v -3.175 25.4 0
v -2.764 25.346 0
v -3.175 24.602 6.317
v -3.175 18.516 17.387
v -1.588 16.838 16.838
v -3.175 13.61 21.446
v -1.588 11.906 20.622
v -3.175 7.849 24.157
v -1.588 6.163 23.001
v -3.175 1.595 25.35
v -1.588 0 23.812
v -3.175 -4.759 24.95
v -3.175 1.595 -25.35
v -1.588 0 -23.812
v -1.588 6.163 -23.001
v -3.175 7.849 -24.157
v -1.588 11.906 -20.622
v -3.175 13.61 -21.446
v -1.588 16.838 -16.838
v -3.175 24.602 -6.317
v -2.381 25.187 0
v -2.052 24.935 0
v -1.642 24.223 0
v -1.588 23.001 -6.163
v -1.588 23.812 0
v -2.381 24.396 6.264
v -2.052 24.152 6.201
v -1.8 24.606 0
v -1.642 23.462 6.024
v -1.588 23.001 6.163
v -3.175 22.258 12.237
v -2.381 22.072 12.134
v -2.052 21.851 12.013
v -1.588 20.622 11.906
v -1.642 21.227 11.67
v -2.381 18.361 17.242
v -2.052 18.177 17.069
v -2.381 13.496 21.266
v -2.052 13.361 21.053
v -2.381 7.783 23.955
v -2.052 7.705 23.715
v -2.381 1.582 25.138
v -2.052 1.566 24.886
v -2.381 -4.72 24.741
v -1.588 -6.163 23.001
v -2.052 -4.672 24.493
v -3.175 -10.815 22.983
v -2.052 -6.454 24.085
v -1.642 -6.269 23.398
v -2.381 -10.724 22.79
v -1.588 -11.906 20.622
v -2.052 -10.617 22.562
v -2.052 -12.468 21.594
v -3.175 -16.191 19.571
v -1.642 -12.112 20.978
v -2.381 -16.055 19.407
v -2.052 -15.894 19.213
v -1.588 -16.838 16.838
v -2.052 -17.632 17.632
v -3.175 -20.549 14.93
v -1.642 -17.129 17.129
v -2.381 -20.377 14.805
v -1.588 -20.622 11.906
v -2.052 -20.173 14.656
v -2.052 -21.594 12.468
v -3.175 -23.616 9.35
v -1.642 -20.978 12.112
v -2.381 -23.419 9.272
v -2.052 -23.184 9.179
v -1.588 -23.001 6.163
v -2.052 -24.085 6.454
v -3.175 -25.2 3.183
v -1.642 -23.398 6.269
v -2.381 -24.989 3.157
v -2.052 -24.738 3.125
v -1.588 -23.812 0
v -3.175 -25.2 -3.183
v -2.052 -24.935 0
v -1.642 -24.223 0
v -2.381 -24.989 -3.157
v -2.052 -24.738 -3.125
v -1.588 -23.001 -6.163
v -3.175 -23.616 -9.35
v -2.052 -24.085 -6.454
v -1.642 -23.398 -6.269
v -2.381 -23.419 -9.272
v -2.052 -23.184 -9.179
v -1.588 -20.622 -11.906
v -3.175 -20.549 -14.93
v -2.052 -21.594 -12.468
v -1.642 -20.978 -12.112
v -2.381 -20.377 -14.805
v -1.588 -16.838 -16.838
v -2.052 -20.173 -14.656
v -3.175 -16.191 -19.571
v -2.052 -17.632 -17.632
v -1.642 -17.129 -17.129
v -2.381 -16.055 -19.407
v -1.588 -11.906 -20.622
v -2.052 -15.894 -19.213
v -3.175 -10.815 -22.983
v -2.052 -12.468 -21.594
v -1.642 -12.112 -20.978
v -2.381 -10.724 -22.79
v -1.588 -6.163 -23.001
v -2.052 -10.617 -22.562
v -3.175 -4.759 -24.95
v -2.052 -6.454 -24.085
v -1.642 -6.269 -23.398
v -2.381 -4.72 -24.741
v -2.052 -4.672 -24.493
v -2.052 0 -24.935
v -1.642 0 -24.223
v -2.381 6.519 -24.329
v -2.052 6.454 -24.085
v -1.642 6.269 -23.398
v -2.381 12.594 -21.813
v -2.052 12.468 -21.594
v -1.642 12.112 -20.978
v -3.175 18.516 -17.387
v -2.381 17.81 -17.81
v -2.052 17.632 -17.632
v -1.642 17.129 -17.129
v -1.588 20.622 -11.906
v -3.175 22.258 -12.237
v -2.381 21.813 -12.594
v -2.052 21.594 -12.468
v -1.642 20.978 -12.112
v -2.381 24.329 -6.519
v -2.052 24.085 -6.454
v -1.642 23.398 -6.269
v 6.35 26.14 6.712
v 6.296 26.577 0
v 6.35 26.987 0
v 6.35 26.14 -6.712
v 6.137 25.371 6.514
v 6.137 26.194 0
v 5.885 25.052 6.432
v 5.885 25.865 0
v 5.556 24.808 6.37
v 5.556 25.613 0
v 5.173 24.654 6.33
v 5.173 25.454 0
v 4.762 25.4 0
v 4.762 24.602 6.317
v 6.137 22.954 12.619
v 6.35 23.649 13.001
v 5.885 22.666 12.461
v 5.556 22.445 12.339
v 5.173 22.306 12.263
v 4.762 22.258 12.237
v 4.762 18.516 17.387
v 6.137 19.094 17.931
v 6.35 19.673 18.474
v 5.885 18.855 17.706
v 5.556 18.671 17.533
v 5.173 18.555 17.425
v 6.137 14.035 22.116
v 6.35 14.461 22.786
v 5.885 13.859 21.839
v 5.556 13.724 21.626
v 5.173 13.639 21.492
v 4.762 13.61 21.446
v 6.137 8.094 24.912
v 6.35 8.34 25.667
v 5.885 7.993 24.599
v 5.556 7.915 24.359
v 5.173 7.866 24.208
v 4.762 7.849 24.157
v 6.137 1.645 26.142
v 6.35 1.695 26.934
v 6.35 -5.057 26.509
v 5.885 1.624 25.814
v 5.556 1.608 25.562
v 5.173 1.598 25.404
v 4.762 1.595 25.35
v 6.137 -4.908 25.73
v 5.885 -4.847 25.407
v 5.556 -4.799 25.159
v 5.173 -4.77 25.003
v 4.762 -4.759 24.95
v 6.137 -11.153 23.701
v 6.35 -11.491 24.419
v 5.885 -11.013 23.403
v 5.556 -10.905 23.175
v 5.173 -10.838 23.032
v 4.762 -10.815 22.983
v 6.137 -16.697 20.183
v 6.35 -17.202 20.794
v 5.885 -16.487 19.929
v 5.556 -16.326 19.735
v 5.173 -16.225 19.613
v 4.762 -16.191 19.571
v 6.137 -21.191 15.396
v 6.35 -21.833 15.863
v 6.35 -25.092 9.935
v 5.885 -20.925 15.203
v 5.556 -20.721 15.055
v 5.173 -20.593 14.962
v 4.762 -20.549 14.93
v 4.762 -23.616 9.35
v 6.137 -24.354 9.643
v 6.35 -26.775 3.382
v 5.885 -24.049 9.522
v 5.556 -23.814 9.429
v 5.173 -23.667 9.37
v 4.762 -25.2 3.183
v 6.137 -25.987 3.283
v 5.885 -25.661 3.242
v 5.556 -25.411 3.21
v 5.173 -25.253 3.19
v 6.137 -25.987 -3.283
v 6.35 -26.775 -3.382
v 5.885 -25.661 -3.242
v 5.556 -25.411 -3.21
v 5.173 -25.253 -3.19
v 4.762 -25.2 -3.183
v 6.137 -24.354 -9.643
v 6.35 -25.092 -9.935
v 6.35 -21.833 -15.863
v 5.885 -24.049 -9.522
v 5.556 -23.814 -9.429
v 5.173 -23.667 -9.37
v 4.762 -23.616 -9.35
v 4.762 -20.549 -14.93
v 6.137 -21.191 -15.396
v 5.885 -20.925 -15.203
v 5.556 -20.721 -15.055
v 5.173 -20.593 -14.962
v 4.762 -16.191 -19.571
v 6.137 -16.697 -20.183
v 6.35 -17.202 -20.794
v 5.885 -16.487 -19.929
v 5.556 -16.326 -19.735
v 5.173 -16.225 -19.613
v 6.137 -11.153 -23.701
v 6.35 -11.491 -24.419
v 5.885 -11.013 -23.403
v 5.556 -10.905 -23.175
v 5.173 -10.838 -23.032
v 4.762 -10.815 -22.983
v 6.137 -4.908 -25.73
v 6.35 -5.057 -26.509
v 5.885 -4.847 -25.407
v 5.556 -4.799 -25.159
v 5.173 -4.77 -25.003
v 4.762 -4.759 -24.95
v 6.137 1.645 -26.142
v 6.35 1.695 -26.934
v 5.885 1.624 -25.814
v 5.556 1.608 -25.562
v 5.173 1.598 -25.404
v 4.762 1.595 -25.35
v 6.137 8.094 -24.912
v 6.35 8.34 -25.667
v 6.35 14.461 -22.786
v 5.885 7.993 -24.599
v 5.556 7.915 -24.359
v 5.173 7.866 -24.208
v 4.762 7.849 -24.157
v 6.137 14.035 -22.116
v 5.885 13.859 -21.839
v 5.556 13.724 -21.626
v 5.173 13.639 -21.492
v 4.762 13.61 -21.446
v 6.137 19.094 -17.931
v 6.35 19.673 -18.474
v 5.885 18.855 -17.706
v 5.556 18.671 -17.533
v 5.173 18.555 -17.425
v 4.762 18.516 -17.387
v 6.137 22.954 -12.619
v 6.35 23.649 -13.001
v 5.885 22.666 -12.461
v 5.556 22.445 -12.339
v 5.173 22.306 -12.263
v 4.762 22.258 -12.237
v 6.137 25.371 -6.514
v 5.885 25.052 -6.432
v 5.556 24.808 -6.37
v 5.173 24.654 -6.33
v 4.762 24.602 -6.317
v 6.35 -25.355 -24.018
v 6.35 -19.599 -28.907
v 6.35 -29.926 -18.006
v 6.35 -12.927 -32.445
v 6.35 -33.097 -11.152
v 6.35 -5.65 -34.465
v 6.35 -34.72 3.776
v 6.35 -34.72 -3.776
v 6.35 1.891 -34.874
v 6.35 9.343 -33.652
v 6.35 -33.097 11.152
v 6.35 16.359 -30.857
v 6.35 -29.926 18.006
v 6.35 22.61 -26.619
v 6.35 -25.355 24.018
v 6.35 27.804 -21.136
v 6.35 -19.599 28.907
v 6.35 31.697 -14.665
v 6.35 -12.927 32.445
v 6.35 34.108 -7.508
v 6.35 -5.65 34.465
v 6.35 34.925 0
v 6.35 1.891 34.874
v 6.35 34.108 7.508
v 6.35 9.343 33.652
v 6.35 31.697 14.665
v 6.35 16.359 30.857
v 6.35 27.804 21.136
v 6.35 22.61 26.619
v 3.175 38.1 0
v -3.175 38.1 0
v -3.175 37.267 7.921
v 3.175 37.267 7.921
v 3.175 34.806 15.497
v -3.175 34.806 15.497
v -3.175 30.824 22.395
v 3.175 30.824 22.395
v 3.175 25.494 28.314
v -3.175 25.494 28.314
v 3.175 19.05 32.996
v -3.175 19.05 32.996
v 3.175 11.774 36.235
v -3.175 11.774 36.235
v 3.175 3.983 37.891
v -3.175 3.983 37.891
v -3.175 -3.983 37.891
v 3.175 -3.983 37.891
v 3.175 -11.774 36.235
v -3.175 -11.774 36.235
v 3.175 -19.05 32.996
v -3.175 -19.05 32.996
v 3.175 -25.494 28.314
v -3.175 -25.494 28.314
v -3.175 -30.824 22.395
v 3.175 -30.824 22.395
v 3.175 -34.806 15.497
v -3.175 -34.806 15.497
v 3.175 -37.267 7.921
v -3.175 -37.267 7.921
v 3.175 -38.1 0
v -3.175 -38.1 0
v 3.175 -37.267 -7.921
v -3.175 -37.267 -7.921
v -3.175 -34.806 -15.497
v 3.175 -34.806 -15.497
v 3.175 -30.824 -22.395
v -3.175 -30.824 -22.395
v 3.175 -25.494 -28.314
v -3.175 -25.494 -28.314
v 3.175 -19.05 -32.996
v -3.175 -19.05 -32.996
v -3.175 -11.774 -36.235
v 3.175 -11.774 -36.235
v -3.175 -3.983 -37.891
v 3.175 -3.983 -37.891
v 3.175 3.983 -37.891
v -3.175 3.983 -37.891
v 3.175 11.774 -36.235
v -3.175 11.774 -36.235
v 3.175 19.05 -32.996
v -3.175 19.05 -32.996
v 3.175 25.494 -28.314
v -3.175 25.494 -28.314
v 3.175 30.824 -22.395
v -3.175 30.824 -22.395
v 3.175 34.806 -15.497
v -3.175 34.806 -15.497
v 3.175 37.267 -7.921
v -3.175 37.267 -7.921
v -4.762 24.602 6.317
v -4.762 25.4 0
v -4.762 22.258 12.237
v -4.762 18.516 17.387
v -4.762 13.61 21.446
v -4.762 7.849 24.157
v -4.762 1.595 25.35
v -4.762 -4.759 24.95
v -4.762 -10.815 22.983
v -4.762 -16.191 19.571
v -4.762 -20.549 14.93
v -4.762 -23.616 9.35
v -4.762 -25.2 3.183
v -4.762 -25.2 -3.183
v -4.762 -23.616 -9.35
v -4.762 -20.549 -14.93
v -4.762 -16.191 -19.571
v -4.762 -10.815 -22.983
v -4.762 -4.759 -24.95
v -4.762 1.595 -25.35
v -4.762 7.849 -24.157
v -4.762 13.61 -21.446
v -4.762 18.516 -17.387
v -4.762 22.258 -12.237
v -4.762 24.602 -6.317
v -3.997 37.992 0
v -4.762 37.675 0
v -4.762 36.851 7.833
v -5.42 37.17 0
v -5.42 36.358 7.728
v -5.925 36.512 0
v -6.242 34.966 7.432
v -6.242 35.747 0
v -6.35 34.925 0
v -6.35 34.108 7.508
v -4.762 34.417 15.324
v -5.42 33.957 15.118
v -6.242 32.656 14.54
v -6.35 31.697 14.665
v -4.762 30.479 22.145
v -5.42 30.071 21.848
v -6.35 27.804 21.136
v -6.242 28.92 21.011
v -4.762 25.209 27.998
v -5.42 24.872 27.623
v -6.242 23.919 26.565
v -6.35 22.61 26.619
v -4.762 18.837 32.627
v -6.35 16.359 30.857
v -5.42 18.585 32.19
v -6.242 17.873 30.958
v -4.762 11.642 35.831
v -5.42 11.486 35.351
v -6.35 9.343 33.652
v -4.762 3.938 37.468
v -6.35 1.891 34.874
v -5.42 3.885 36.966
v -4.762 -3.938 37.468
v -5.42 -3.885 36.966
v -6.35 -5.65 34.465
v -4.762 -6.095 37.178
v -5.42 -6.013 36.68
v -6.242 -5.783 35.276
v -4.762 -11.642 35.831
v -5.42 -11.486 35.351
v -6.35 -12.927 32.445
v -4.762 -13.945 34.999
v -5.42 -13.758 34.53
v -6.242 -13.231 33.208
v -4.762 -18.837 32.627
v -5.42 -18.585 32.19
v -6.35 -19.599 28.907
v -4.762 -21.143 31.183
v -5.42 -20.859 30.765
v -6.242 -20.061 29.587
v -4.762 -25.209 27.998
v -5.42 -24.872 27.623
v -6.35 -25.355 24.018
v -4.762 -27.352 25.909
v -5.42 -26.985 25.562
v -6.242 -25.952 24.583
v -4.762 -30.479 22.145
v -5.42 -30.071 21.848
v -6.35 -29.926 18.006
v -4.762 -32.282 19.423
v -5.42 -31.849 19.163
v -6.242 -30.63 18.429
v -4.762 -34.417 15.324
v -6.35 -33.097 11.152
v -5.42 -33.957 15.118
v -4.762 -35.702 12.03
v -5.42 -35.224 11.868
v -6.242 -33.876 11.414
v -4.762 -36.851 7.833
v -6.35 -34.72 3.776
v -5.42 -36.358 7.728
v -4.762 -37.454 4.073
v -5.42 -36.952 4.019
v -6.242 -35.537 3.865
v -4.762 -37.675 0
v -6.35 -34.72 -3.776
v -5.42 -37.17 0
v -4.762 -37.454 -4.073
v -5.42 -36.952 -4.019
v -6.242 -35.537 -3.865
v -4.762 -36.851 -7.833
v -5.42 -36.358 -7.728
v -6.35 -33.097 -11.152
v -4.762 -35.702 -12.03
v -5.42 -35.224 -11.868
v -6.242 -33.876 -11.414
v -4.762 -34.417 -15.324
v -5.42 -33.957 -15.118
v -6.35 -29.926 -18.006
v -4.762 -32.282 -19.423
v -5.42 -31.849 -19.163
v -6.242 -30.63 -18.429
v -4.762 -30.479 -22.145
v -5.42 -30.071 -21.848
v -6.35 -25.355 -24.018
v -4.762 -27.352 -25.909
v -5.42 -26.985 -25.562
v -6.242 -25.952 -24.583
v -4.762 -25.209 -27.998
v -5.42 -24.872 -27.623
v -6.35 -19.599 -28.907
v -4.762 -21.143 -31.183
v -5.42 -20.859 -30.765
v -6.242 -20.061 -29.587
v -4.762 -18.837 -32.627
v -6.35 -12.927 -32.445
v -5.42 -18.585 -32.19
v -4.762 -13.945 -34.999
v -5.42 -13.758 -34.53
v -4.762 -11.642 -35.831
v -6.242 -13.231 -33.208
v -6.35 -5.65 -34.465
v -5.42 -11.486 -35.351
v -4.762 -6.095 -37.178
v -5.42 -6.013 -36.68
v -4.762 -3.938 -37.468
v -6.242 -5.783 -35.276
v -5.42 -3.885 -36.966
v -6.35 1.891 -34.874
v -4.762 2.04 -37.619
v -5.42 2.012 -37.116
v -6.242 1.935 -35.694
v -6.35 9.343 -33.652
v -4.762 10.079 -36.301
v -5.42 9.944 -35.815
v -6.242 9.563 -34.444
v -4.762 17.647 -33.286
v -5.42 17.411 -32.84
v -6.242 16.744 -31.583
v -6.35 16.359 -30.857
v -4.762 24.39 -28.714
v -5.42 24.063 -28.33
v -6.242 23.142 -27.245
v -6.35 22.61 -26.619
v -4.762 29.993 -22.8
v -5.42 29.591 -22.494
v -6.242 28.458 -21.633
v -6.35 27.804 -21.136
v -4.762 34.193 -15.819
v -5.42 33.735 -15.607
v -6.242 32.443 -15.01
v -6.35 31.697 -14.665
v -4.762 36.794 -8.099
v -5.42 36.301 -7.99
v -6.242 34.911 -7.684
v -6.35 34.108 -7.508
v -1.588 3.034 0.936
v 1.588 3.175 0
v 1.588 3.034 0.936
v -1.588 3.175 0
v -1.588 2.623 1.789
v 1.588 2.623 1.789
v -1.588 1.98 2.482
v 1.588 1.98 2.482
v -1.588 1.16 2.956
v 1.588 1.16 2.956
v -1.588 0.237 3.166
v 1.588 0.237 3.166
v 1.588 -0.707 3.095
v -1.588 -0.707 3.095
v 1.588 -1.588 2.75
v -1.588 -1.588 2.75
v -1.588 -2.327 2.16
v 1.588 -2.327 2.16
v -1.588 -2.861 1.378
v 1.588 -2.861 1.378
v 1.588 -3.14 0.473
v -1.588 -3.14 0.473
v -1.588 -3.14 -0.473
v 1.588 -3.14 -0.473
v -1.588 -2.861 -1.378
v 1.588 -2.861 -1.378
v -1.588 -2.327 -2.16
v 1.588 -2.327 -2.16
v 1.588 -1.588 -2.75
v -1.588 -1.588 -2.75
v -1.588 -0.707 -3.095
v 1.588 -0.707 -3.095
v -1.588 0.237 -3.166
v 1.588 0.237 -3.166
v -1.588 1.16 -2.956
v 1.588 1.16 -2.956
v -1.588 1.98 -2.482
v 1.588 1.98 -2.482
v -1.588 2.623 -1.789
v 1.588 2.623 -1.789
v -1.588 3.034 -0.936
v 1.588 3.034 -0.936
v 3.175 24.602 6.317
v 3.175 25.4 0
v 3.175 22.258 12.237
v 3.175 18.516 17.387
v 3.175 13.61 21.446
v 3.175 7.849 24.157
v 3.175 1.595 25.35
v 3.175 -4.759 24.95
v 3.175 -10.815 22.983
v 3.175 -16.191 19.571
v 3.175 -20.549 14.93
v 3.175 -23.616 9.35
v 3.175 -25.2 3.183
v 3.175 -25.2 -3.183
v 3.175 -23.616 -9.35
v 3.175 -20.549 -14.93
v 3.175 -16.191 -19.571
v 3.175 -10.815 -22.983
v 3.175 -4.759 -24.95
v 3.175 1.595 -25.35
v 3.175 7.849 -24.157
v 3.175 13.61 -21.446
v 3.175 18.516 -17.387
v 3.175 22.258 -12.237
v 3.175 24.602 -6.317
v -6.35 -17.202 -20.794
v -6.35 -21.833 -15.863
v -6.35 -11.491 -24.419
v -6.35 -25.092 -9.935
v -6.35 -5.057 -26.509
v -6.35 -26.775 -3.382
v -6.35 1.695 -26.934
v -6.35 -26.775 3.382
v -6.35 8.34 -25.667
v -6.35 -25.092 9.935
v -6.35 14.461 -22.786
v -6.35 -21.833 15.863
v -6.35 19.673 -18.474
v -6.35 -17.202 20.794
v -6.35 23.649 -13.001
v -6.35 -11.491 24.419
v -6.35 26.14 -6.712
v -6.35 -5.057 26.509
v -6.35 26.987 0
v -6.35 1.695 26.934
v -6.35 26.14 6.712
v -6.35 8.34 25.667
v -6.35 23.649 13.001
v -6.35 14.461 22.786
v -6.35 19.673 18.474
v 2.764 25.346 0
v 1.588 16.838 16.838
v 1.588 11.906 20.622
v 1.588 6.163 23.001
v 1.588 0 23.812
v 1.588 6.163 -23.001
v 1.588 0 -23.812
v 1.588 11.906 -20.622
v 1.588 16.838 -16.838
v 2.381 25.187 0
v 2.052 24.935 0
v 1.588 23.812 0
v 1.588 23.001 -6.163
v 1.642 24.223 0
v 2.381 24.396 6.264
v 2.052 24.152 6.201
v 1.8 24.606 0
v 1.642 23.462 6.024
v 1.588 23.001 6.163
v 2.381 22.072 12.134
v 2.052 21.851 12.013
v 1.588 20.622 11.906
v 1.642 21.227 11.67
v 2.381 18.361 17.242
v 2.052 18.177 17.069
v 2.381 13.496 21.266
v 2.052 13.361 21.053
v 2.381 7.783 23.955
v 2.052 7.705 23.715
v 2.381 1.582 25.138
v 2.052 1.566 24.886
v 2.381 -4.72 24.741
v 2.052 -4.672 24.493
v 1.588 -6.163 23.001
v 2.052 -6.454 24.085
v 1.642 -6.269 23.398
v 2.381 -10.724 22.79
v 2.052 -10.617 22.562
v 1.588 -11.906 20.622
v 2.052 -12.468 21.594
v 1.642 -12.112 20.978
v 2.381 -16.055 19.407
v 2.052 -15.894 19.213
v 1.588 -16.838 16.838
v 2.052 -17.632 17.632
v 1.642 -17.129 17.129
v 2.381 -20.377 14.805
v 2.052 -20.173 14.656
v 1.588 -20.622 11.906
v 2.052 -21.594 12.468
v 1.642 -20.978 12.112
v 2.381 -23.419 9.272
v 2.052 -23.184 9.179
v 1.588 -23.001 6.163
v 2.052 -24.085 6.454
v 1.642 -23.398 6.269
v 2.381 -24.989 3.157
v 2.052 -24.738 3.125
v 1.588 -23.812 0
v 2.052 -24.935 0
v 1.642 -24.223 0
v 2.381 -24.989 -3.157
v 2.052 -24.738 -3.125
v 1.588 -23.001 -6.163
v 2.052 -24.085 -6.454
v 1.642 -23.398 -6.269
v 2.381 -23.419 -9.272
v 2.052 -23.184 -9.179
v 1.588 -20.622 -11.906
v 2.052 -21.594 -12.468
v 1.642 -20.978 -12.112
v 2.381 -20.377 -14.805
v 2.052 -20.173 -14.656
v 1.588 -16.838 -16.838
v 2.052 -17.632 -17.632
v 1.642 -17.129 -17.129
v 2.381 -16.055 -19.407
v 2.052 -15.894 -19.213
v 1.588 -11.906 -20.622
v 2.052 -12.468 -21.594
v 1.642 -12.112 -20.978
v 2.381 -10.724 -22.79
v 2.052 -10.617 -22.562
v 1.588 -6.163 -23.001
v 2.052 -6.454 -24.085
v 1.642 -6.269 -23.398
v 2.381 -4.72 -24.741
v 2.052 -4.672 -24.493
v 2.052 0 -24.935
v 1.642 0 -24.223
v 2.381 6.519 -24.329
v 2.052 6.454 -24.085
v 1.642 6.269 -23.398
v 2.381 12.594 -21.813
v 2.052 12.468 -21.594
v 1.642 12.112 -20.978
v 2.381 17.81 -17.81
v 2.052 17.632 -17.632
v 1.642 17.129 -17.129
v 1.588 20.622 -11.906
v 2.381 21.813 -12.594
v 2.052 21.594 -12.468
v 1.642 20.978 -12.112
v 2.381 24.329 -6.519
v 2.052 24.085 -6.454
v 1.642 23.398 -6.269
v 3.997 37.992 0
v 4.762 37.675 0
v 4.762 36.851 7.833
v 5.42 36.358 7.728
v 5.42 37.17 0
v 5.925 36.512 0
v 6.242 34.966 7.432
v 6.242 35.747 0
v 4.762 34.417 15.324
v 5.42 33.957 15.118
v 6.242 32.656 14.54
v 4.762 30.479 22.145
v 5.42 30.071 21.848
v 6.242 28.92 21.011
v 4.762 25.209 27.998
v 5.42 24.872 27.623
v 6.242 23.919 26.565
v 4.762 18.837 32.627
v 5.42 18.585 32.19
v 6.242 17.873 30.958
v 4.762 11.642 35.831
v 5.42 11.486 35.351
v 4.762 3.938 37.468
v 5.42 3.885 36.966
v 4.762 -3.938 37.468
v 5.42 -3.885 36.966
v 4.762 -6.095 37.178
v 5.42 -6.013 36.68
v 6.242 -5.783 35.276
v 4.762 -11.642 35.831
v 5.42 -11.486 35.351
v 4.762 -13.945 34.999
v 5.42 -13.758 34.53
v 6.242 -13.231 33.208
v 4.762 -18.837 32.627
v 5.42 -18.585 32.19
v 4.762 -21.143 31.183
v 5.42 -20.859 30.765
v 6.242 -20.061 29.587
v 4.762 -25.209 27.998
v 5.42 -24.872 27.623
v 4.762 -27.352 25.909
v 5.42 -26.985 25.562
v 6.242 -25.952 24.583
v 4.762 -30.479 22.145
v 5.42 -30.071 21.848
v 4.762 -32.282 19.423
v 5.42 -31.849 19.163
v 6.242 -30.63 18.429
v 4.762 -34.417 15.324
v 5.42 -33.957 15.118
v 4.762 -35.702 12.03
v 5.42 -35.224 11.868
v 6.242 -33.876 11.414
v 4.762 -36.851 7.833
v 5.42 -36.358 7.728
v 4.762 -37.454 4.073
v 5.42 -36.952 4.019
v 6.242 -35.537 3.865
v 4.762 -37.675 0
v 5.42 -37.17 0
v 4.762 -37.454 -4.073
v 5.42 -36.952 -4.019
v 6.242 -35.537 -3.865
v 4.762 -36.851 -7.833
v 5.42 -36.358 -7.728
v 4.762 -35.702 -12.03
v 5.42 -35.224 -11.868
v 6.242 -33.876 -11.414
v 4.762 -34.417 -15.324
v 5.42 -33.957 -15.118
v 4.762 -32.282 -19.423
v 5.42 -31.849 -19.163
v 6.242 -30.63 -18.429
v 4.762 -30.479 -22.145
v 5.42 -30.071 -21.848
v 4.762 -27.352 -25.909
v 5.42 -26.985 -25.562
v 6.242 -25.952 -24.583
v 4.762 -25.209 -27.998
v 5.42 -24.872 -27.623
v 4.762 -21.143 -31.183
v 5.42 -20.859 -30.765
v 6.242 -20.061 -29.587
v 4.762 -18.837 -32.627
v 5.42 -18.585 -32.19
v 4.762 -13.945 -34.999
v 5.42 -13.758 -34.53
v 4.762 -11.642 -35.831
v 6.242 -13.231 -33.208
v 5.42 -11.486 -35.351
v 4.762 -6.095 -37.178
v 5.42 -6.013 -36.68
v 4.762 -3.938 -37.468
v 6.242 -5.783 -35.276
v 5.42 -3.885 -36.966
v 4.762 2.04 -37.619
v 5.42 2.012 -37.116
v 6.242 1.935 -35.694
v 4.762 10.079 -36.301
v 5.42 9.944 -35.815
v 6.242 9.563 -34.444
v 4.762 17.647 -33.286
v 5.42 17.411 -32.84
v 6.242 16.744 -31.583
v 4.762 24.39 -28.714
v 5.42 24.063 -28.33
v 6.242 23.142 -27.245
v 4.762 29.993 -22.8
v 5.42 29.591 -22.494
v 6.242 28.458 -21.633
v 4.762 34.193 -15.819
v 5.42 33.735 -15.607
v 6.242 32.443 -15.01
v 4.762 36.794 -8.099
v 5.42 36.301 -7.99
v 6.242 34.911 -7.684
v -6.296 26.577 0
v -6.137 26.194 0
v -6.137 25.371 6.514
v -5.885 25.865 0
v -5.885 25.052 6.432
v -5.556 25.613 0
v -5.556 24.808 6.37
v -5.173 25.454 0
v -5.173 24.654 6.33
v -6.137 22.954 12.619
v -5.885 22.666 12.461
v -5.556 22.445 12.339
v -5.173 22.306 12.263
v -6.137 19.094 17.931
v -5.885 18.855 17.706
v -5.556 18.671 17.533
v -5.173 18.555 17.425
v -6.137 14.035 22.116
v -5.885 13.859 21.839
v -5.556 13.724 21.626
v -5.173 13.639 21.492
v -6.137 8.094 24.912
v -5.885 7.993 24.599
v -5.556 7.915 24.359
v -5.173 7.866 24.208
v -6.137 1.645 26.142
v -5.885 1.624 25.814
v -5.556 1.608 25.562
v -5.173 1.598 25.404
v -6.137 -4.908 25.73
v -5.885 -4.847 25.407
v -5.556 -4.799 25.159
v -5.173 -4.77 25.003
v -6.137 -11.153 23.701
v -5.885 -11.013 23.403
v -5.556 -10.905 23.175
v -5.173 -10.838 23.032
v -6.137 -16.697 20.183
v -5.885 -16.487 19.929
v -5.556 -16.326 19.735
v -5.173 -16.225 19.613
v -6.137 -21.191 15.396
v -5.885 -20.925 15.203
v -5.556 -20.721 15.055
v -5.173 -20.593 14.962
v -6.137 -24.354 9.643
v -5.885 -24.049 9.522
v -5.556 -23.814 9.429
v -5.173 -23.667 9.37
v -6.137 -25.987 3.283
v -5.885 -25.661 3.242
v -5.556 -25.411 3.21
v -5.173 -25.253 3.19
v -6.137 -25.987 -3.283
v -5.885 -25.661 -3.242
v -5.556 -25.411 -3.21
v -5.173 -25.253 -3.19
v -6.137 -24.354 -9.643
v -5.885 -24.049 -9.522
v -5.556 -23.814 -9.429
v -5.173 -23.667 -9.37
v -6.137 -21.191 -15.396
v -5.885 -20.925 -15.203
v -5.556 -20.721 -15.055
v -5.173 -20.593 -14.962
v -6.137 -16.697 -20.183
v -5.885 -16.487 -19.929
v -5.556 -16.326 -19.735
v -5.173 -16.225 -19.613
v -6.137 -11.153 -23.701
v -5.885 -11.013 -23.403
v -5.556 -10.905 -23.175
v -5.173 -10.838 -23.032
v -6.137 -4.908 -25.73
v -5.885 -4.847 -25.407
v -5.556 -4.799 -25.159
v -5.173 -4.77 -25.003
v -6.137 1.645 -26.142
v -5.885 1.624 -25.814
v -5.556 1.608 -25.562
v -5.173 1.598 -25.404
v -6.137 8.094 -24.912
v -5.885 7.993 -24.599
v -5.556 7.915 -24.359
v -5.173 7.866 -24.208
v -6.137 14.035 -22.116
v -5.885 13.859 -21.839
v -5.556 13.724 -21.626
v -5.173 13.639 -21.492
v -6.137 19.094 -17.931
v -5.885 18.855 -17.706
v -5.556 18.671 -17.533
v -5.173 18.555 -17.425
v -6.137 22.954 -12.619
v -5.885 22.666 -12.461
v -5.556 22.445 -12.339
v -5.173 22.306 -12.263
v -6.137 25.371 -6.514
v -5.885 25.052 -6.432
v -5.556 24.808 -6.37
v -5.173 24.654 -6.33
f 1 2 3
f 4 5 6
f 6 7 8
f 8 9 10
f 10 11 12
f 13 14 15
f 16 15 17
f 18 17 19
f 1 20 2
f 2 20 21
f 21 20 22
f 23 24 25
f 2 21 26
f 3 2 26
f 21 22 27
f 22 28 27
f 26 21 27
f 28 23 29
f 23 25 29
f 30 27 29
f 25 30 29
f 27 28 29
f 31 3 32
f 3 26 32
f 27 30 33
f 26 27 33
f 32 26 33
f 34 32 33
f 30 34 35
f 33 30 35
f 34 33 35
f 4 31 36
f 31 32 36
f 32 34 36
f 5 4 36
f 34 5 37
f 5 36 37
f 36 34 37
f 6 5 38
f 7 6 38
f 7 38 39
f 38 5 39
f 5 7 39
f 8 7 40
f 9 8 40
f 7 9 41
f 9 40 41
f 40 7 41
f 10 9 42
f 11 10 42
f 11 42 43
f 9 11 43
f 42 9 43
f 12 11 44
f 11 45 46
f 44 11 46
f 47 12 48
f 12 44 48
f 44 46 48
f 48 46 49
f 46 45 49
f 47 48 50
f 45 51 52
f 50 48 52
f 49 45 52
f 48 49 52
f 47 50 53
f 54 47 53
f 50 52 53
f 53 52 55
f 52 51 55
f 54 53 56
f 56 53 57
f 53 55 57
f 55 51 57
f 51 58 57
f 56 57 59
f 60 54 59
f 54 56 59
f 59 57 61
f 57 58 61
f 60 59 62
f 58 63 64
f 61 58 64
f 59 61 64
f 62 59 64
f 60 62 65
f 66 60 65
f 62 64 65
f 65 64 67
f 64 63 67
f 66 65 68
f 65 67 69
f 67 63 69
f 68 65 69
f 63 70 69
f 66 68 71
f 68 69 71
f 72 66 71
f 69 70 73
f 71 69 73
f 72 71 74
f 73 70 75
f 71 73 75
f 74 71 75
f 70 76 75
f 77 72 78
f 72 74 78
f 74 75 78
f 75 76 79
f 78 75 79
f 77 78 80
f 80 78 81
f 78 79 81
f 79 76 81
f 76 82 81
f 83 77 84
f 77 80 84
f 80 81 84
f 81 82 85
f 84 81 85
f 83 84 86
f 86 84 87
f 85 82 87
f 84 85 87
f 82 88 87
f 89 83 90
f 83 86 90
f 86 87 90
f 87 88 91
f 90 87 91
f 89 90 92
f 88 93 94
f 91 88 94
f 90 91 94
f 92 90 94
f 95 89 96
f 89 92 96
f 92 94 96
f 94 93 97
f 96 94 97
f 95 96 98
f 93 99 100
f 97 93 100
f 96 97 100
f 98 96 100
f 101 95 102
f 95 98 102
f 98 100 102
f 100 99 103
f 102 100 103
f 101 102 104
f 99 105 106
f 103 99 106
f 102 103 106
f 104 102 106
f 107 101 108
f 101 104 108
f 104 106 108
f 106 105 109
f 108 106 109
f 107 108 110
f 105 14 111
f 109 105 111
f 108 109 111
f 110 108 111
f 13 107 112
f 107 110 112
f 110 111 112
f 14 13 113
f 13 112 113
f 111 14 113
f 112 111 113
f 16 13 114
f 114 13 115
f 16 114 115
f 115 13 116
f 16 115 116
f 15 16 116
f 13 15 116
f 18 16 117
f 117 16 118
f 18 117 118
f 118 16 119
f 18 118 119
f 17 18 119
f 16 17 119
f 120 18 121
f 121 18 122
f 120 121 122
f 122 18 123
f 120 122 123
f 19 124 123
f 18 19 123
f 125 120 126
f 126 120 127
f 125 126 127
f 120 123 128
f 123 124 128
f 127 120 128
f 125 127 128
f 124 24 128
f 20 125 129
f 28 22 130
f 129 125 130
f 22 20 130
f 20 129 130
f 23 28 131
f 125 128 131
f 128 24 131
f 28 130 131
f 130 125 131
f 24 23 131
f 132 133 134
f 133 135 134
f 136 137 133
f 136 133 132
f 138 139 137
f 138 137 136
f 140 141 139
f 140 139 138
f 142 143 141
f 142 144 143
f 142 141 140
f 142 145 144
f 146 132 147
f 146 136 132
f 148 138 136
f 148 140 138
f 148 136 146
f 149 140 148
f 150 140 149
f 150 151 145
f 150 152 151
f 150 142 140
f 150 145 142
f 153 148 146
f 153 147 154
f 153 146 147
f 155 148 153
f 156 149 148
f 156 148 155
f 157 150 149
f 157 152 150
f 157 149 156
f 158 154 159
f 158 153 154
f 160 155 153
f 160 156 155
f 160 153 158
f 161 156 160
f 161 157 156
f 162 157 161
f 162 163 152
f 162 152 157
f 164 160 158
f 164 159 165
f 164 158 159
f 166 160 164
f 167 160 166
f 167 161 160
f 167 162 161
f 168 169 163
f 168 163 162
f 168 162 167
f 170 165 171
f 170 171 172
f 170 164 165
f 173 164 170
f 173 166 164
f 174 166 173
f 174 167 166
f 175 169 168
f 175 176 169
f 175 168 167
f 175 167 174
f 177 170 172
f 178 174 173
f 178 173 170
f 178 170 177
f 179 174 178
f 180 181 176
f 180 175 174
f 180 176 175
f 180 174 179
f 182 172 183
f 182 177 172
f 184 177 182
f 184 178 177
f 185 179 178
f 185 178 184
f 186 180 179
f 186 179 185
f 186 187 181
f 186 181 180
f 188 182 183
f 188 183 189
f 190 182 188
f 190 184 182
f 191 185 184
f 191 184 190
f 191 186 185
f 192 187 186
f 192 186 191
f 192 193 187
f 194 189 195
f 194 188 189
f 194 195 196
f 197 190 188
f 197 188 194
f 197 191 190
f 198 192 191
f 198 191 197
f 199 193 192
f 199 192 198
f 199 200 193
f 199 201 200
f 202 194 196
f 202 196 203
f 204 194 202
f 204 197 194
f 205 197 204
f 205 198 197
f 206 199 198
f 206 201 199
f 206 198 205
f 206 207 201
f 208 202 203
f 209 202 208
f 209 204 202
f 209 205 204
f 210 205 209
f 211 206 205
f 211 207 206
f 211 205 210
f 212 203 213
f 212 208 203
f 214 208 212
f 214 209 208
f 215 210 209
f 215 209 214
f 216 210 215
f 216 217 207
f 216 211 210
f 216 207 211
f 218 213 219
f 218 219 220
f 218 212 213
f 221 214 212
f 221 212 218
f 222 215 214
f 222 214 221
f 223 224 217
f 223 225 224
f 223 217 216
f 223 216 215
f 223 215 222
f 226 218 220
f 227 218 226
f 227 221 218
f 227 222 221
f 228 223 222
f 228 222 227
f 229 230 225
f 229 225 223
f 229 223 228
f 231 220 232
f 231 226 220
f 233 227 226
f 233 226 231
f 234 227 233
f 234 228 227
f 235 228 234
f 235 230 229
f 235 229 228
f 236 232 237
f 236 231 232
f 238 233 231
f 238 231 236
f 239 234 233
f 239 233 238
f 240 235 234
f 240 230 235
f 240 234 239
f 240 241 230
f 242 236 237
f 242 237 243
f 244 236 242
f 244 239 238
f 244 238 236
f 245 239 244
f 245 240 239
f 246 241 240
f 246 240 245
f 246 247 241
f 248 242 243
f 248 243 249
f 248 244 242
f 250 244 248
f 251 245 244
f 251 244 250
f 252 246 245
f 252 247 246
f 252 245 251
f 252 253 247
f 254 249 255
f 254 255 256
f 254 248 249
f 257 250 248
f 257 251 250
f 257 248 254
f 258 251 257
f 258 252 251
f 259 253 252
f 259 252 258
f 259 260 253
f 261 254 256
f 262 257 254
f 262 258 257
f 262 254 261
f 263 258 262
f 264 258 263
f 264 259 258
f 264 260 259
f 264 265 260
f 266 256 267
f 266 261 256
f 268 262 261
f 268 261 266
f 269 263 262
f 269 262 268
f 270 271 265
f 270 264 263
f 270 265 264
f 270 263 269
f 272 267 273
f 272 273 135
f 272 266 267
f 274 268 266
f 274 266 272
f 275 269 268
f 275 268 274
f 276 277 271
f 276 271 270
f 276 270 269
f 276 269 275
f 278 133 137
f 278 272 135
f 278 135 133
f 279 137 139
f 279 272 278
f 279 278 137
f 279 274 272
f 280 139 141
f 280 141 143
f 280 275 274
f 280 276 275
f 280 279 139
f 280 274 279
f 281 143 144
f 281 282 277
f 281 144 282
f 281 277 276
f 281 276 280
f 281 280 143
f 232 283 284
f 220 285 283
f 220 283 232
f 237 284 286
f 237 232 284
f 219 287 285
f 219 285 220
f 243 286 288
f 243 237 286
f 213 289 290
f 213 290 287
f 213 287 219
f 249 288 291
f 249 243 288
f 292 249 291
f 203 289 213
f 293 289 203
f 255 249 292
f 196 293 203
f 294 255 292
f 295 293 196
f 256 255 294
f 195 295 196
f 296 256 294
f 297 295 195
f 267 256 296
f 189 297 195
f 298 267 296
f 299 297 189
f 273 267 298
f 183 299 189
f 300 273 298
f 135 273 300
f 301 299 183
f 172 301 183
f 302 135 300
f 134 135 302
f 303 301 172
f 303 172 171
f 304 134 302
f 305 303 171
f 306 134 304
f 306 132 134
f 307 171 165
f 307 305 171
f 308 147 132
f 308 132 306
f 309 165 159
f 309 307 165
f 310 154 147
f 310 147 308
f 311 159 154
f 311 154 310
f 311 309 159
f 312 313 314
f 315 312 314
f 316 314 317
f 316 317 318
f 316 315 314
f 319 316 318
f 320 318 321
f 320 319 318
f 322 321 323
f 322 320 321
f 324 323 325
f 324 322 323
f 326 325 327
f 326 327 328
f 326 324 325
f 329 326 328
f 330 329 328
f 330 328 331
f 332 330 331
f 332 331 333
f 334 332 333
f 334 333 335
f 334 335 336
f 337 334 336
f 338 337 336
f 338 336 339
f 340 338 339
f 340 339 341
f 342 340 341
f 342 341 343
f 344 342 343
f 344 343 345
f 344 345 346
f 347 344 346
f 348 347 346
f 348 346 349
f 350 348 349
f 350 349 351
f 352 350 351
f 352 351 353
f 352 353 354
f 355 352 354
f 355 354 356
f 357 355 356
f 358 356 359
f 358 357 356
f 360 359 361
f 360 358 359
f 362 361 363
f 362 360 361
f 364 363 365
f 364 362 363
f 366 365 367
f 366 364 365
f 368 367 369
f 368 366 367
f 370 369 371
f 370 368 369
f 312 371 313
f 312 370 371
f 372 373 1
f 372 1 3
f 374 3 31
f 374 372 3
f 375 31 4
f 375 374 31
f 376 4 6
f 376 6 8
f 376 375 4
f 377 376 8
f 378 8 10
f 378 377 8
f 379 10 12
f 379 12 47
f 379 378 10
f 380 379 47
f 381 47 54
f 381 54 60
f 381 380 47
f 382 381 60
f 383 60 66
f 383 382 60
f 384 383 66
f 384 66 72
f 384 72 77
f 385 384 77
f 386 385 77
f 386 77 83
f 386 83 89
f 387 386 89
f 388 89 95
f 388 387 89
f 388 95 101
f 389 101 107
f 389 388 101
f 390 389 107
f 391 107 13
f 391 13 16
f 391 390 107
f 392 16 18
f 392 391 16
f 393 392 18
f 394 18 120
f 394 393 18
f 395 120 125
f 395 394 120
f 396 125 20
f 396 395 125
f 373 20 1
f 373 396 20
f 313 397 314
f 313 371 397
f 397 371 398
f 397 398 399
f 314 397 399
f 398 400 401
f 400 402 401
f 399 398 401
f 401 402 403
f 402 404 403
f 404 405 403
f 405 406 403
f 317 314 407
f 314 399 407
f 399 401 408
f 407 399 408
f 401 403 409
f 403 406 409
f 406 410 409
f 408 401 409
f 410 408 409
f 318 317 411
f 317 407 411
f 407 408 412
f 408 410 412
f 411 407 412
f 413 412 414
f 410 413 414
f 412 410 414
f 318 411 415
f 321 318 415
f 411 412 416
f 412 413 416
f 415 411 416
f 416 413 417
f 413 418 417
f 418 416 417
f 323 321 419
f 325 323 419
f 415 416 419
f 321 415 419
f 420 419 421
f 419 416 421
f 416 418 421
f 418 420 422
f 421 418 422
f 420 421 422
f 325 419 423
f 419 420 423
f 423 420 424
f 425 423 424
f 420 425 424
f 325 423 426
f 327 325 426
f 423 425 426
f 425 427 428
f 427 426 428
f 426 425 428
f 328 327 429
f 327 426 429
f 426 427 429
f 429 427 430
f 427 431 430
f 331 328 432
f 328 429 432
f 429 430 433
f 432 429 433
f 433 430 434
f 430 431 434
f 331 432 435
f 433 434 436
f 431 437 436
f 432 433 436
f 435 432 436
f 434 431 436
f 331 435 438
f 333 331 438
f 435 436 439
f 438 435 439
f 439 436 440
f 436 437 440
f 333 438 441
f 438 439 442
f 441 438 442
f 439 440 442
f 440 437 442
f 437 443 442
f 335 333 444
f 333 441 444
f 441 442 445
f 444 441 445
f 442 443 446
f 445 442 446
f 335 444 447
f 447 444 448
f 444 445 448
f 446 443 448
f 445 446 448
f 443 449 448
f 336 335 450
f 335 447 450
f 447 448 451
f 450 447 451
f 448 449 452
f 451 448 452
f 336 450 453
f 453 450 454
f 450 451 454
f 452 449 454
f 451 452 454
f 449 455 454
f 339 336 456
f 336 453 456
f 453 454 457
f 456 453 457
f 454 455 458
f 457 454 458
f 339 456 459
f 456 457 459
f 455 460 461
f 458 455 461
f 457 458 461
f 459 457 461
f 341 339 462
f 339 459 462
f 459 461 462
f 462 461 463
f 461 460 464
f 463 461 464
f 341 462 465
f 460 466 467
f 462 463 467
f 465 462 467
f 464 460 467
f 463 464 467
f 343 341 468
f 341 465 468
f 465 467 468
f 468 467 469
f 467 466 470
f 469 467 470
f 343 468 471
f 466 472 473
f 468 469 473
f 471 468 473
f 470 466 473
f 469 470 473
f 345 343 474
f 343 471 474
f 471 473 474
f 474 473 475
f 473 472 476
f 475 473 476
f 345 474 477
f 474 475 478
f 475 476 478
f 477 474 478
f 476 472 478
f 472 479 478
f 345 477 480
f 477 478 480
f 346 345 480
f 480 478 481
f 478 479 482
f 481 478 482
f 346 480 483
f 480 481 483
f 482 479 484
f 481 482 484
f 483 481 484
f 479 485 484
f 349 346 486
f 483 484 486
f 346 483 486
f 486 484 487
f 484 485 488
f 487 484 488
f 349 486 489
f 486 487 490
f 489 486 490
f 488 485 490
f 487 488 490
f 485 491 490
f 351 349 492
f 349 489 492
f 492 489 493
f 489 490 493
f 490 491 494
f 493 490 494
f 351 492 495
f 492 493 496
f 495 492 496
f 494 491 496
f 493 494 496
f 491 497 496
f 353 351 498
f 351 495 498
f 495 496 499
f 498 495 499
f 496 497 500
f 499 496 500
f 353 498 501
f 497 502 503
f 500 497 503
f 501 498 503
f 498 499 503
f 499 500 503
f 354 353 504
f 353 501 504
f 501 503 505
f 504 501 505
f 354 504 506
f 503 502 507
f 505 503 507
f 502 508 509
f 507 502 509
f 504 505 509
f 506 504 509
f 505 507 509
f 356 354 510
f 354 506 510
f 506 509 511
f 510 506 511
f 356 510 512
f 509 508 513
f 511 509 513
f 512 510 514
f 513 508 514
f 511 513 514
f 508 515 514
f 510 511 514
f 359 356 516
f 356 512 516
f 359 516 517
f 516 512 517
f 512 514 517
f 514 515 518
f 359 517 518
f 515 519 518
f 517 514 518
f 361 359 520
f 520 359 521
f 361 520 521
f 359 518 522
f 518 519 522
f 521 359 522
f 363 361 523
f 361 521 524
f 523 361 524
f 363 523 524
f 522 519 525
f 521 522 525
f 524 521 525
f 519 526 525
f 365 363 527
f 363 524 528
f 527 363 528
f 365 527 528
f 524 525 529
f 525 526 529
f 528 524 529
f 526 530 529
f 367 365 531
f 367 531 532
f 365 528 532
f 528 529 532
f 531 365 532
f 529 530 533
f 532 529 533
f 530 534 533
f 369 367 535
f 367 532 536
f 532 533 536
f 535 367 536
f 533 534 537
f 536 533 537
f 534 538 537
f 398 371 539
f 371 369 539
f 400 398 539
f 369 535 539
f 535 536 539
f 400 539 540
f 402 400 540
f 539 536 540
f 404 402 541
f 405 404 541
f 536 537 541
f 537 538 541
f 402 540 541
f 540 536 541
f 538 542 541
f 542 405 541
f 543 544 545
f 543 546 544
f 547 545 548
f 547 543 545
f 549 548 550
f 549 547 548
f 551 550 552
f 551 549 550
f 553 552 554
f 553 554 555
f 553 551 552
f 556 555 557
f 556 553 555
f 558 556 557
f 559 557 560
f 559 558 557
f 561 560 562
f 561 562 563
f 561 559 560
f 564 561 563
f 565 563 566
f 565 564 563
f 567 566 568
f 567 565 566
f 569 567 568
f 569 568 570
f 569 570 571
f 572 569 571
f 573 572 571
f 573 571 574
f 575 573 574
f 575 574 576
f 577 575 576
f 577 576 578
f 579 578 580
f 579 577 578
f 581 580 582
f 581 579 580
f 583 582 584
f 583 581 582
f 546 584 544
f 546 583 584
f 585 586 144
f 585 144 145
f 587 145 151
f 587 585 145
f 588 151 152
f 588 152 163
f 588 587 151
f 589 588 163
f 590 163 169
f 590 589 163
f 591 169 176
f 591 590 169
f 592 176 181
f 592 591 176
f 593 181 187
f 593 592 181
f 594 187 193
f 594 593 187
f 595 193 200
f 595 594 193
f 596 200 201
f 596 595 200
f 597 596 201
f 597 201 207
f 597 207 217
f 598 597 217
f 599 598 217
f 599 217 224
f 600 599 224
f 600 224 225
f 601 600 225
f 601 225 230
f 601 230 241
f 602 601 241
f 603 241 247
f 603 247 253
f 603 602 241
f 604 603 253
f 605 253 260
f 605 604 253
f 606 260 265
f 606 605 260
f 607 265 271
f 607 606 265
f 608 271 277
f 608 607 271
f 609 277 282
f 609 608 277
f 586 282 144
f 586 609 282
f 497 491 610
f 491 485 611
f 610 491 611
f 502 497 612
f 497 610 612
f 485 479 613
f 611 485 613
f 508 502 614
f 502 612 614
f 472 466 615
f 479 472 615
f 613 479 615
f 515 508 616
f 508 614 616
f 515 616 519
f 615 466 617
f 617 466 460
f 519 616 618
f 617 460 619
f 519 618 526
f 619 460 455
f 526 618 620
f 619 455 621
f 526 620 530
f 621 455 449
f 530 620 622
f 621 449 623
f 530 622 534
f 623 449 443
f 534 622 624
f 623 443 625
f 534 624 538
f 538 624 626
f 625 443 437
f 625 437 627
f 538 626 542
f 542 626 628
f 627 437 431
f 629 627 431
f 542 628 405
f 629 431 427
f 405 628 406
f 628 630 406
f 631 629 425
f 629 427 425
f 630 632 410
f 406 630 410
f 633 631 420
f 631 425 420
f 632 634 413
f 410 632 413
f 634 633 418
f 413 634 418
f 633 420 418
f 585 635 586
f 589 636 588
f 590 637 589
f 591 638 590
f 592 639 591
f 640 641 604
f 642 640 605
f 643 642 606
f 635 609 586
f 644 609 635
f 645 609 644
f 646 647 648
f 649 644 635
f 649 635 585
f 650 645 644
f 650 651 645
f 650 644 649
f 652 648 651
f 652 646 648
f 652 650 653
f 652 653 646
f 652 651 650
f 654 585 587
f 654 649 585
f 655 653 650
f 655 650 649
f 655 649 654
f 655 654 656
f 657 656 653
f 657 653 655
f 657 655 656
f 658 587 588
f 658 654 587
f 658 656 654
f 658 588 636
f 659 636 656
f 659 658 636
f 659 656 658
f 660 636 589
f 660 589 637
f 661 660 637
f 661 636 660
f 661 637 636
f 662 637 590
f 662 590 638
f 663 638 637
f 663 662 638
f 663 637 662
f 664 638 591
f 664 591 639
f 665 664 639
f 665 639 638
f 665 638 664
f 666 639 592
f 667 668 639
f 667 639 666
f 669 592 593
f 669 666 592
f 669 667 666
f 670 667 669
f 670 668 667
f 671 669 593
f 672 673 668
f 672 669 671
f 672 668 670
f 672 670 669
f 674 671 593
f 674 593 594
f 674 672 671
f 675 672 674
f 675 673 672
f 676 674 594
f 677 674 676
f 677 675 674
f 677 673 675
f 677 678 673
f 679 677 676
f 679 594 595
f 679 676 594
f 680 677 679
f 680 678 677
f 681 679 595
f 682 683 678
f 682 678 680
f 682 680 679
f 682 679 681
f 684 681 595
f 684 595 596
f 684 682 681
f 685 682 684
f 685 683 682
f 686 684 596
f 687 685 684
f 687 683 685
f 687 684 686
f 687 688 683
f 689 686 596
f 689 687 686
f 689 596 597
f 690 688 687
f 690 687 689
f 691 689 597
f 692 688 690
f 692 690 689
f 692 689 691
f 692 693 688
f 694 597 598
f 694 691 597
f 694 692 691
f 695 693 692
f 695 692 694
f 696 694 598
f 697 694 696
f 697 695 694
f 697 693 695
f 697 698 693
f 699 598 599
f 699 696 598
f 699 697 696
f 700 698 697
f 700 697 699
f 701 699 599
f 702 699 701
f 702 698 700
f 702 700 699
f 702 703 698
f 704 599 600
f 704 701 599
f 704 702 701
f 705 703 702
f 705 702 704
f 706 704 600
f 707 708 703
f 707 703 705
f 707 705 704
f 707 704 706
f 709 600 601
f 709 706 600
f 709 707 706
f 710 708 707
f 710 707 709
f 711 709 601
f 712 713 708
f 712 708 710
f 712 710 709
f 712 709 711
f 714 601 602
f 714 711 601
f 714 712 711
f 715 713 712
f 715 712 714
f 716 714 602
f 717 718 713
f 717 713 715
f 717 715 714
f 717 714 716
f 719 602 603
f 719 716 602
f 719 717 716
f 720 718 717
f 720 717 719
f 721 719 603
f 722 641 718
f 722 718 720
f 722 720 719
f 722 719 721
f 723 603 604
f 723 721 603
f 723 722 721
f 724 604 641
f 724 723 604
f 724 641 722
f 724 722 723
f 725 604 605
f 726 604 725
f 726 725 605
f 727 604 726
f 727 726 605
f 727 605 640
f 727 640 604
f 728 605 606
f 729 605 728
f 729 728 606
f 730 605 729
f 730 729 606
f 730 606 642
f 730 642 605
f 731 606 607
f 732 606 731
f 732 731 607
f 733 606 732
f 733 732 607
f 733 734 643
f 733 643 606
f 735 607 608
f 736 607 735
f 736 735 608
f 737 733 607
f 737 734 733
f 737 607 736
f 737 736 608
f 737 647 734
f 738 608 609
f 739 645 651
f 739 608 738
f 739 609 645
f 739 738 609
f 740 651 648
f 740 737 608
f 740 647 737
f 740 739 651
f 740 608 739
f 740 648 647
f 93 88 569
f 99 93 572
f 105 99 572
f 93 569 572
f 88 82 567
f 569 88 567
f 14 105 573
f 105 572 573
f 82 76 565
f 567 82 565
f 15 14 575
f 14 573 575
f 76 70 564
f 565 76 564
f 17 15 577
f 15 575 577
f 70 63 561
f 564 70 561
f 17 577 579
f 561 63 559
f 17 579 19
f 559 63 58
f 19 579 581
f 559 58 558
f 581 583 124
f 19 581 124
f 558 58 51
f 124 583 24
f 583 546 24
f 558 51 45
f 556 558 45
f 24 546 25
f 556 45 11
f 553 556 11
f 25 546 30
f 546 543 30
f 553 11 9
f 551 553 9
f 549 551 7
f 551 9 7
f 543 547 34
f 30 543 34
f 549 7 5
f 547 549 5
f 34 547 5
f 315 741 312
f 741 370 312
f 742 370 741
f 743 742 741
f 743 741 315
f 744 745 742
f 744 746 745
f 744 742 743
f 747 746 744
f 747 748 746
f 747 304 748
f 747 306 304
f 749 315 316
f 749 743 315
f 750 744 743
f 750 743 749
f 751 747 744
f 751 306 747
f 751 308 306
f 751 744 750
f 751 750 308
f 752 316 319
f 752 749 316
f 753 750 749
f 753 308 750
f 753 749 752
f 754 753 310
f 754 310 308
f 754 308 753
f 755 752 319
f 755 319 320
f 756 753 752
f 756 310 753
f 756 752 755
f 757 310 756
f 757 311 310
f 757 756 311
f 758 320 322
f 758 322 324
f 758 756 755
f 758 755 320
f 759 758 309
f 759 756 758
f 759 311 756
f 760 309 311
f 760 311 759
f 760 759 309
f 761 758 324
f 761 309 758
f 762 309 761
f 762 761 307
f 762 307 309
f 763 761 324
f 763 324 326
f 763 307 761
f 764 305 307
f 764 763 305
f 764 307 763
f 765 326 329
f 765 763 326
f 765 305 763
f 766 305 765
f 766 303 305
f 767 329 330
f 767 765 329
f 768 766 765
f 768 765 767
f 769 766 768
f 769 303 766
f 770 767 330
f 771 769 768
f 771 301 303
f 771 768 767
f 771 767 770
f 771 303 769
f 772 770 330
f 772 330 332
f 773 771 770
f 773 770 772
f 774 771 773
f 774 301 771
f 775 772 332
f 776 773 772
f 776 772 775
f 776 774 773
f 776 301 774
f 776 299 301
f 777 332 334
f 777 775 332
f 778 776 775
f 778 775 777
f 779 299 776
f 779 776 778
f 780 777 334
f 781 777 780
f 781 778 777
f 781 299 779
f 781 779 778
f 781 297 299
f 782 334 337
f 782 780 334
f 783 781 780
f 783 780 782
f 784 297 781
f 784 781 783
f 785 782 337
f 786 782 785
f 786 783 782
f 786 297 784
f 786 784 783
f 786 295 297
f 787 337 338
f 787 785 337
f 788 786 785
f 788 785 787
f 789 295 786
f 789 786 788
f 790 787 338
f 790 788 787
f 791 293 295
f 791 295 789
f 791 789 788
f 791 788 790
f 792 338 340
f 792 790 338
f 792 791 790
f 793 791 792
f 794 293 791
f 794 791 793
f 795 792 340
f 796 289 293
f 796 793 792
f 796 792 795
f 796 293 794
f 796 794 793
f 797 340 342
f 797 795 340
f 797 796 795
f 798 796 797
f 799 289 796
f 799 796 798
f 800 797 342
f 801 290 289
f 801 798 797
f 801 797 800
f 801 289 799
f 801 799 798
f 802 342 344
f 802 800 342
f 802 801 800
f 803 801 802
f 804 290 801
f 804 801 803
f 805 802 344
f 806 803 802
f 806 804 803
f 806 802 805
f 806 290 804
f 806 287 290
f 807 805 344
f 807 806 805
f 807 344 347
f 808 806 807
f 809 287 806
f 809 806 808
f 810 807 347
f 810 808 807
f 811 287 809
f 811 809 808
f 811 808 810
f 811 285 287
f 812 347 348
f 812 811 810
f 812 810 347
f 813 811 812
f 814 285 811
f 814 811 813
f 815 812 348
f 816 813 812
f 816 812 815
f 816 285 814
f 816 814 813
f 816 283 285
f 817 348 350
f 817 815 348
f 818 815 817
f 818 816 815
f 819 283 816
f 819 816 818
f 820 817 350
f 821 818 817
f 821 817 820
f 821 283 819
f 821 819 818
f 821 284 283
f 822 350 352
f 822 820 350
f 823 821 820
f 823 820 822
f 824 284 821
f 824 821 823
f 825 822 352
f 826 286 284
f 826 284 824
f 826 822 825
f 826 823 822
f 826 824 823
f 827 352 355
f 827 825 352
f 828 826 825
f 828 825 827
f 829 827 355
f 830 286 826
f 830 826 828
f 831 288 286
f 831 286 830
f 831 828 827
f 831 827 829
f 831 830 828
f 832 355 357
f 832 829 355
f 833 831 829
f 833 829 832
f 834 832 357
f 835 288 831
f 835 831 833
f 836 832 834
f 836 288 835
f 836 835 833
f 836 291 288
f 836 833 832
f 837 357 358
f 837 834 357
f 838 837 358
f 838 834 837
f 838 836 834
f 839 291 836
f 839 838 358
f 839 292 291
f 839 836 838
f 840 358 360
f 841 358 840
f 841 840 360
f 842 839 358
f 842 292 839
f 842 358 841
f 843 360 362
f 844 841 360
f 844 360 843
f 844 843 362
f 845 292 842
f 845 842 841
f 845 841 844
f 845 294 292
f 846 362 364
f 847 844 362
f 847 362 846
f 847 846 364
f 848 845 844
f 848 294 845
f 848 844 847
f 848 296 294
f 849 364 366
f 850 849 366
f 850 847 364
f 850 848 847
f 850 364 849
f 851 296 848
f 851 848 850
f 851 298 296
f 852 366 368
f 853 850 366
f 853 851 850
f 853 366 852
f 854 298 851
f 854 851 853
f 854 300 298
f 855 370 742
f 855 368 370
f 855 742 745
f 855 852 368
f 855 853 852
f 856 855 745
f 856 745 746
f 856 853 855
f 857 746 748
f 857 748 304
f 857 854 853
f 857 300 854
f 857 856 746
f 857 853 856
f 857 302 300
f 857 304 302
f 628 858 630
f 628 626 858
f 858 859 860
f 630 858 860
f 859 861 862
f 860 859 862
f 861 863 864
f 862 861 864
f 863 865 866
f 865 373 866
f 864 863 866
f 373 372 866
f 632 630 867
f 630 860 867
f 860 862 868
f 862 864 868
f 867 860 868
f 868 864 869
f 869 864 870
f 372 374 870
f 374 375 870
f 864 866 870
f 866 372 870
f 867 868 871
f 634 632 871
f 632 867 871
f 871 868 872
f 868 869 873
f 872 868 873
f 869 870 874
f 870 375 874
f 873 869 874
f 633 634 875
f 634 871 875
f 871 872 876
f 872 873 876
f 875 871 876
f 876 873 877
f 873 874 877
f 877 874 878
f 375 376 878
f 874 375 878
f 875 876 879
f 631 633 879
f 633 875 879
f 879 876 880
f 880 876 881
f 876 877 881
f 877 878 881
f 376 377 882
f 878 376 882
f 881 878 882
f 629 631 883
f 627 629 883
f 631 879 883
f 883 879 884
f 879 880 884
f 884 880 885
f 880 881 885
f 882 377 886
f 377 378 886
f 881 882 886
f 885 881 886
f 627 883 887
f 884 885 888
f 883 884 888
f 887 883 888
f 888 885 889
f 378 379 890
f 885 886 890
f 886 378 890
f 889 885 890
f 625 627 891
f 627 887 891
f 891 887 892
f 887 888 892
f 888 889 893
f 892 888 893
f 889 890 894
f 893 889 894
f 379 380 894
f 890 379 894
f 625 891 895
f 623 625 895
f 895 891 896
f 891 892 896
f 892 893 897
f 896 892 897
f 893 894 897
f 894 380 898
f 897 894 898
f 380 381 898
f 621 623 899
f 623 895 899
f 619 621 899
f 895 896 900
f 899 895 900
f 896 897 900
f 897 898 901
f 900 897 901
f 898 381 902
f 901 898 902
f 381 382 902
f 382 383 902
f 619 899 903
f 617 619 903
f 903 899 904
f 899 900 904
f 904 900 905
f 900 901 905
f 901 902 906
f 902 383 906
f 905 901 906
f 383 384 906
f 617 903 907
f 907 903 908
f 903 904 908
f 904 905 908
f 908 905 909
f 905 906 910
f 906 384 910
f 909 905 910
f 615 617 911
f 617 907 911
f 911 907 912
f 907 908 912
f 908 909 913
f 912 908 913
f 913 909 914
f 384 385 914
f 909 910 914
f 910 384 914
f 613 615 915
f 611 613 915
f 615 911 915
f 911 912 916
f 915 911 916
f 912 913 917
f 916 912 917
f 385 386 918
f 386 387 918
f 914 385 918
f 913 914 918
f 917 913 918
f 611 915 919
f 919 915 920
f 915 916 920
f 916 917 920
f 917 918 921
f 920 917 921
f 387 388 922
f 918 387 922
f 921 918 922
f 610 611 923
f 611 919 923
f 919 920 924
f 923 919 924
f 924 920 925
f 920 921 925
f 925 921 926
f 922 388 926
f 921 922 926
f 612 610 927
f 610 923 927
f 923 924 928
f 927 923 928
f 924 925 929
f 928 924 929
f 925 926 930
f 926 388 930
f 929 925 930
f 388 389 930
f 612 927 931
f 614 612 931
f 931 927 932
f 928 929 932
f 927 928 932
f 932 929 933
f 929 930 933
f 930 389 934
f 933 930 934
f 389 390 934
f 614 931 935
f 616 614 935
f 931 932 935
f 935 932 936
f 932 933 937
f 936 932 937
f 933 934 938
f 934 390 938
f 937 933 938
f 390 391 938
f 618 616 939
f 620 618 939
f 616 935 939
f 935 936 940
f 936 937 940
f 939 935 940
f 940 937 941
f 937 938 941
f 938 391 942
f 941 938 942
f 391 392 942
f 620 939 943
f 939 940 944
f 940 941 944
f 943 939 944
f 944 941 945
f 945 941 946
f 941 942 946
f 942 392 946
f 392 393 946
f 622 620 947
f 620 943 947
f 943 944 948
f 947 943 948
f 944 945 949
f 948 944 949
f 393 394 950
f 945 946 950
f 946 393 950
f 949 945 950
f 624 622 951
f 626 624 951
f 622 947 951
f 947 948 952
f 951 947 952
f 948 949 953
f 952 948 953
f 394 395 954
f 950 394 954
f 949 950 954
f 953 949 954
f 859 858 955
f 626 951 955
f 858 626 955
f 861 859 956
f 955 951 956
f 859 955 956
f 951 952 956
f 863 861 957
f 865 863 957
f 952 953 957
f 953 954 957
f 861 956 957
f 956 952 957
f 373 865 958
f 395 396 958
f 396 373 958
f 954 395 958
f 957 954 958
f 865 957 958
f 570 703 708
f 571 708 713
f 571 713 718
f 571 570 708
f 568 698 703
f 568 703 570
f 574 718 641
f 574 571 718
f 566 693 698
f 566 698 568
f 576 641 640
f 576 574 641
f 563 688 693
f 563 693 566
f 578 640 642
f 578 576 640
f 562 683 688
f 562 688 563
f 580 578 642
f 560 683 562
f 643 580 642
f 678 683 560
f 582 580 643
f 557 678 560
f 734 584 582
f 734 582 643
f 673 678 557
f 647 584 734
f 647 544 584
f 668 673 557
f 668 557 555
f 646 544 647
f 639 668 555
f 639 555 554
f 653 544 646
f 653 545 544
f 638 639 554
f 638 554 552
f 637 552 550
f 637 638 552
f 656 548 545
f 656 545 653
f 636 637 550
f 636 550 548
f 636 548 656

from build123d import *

# Parameters (mm, degrees)
F0_R     = 25.4
F0_R_2   = 3.175
F1_DEPTH = 1.5875
F0_R_3   = 38.1
F2_DEPTH = 6.35
F3_R     = 3.175
F4_R     = 1.5875


with BuildPart() as f1:
    # F0 (on Right) → F1 (new body, symmetric)
    with BuildSketch(Plane.YZ):
        Circle(F0_R)
        Circle(F0_R_2, mode=Mode.SUBTRACT)
    extrude(amount=F1_DEPTH, both=True)

    # F0 (on Right) → F2 (join, symmetric)
    with BuildSketch(Plane.YZ):
        Circle(F0_R_3)
        Circle(F0_R, mode=Mode.SUBTRACT)
    extrude(amount=F2_DEPTH, both=True)

    # F3
    f3_edges = [f1.edges().sort_by_distance(p)[0] for p in [
        (-6.35, -38.1, 0),
        (6.35, -38.1, 0),
    ]]
    fillet(f3_edges, radius=F3_R)

    # F4
    f4_edges = [f1.edges().sort_by_distance(p)[0] for p in [
        (1.5875, -25.4, 0),
        (6.35, -25.4, 0),
        (-1.5875, -25.4, 0),
        (-6.35, -25.4, 0),
    ]]
    fillet(f4_edges, radius=F4_R)


solid = f1.part
